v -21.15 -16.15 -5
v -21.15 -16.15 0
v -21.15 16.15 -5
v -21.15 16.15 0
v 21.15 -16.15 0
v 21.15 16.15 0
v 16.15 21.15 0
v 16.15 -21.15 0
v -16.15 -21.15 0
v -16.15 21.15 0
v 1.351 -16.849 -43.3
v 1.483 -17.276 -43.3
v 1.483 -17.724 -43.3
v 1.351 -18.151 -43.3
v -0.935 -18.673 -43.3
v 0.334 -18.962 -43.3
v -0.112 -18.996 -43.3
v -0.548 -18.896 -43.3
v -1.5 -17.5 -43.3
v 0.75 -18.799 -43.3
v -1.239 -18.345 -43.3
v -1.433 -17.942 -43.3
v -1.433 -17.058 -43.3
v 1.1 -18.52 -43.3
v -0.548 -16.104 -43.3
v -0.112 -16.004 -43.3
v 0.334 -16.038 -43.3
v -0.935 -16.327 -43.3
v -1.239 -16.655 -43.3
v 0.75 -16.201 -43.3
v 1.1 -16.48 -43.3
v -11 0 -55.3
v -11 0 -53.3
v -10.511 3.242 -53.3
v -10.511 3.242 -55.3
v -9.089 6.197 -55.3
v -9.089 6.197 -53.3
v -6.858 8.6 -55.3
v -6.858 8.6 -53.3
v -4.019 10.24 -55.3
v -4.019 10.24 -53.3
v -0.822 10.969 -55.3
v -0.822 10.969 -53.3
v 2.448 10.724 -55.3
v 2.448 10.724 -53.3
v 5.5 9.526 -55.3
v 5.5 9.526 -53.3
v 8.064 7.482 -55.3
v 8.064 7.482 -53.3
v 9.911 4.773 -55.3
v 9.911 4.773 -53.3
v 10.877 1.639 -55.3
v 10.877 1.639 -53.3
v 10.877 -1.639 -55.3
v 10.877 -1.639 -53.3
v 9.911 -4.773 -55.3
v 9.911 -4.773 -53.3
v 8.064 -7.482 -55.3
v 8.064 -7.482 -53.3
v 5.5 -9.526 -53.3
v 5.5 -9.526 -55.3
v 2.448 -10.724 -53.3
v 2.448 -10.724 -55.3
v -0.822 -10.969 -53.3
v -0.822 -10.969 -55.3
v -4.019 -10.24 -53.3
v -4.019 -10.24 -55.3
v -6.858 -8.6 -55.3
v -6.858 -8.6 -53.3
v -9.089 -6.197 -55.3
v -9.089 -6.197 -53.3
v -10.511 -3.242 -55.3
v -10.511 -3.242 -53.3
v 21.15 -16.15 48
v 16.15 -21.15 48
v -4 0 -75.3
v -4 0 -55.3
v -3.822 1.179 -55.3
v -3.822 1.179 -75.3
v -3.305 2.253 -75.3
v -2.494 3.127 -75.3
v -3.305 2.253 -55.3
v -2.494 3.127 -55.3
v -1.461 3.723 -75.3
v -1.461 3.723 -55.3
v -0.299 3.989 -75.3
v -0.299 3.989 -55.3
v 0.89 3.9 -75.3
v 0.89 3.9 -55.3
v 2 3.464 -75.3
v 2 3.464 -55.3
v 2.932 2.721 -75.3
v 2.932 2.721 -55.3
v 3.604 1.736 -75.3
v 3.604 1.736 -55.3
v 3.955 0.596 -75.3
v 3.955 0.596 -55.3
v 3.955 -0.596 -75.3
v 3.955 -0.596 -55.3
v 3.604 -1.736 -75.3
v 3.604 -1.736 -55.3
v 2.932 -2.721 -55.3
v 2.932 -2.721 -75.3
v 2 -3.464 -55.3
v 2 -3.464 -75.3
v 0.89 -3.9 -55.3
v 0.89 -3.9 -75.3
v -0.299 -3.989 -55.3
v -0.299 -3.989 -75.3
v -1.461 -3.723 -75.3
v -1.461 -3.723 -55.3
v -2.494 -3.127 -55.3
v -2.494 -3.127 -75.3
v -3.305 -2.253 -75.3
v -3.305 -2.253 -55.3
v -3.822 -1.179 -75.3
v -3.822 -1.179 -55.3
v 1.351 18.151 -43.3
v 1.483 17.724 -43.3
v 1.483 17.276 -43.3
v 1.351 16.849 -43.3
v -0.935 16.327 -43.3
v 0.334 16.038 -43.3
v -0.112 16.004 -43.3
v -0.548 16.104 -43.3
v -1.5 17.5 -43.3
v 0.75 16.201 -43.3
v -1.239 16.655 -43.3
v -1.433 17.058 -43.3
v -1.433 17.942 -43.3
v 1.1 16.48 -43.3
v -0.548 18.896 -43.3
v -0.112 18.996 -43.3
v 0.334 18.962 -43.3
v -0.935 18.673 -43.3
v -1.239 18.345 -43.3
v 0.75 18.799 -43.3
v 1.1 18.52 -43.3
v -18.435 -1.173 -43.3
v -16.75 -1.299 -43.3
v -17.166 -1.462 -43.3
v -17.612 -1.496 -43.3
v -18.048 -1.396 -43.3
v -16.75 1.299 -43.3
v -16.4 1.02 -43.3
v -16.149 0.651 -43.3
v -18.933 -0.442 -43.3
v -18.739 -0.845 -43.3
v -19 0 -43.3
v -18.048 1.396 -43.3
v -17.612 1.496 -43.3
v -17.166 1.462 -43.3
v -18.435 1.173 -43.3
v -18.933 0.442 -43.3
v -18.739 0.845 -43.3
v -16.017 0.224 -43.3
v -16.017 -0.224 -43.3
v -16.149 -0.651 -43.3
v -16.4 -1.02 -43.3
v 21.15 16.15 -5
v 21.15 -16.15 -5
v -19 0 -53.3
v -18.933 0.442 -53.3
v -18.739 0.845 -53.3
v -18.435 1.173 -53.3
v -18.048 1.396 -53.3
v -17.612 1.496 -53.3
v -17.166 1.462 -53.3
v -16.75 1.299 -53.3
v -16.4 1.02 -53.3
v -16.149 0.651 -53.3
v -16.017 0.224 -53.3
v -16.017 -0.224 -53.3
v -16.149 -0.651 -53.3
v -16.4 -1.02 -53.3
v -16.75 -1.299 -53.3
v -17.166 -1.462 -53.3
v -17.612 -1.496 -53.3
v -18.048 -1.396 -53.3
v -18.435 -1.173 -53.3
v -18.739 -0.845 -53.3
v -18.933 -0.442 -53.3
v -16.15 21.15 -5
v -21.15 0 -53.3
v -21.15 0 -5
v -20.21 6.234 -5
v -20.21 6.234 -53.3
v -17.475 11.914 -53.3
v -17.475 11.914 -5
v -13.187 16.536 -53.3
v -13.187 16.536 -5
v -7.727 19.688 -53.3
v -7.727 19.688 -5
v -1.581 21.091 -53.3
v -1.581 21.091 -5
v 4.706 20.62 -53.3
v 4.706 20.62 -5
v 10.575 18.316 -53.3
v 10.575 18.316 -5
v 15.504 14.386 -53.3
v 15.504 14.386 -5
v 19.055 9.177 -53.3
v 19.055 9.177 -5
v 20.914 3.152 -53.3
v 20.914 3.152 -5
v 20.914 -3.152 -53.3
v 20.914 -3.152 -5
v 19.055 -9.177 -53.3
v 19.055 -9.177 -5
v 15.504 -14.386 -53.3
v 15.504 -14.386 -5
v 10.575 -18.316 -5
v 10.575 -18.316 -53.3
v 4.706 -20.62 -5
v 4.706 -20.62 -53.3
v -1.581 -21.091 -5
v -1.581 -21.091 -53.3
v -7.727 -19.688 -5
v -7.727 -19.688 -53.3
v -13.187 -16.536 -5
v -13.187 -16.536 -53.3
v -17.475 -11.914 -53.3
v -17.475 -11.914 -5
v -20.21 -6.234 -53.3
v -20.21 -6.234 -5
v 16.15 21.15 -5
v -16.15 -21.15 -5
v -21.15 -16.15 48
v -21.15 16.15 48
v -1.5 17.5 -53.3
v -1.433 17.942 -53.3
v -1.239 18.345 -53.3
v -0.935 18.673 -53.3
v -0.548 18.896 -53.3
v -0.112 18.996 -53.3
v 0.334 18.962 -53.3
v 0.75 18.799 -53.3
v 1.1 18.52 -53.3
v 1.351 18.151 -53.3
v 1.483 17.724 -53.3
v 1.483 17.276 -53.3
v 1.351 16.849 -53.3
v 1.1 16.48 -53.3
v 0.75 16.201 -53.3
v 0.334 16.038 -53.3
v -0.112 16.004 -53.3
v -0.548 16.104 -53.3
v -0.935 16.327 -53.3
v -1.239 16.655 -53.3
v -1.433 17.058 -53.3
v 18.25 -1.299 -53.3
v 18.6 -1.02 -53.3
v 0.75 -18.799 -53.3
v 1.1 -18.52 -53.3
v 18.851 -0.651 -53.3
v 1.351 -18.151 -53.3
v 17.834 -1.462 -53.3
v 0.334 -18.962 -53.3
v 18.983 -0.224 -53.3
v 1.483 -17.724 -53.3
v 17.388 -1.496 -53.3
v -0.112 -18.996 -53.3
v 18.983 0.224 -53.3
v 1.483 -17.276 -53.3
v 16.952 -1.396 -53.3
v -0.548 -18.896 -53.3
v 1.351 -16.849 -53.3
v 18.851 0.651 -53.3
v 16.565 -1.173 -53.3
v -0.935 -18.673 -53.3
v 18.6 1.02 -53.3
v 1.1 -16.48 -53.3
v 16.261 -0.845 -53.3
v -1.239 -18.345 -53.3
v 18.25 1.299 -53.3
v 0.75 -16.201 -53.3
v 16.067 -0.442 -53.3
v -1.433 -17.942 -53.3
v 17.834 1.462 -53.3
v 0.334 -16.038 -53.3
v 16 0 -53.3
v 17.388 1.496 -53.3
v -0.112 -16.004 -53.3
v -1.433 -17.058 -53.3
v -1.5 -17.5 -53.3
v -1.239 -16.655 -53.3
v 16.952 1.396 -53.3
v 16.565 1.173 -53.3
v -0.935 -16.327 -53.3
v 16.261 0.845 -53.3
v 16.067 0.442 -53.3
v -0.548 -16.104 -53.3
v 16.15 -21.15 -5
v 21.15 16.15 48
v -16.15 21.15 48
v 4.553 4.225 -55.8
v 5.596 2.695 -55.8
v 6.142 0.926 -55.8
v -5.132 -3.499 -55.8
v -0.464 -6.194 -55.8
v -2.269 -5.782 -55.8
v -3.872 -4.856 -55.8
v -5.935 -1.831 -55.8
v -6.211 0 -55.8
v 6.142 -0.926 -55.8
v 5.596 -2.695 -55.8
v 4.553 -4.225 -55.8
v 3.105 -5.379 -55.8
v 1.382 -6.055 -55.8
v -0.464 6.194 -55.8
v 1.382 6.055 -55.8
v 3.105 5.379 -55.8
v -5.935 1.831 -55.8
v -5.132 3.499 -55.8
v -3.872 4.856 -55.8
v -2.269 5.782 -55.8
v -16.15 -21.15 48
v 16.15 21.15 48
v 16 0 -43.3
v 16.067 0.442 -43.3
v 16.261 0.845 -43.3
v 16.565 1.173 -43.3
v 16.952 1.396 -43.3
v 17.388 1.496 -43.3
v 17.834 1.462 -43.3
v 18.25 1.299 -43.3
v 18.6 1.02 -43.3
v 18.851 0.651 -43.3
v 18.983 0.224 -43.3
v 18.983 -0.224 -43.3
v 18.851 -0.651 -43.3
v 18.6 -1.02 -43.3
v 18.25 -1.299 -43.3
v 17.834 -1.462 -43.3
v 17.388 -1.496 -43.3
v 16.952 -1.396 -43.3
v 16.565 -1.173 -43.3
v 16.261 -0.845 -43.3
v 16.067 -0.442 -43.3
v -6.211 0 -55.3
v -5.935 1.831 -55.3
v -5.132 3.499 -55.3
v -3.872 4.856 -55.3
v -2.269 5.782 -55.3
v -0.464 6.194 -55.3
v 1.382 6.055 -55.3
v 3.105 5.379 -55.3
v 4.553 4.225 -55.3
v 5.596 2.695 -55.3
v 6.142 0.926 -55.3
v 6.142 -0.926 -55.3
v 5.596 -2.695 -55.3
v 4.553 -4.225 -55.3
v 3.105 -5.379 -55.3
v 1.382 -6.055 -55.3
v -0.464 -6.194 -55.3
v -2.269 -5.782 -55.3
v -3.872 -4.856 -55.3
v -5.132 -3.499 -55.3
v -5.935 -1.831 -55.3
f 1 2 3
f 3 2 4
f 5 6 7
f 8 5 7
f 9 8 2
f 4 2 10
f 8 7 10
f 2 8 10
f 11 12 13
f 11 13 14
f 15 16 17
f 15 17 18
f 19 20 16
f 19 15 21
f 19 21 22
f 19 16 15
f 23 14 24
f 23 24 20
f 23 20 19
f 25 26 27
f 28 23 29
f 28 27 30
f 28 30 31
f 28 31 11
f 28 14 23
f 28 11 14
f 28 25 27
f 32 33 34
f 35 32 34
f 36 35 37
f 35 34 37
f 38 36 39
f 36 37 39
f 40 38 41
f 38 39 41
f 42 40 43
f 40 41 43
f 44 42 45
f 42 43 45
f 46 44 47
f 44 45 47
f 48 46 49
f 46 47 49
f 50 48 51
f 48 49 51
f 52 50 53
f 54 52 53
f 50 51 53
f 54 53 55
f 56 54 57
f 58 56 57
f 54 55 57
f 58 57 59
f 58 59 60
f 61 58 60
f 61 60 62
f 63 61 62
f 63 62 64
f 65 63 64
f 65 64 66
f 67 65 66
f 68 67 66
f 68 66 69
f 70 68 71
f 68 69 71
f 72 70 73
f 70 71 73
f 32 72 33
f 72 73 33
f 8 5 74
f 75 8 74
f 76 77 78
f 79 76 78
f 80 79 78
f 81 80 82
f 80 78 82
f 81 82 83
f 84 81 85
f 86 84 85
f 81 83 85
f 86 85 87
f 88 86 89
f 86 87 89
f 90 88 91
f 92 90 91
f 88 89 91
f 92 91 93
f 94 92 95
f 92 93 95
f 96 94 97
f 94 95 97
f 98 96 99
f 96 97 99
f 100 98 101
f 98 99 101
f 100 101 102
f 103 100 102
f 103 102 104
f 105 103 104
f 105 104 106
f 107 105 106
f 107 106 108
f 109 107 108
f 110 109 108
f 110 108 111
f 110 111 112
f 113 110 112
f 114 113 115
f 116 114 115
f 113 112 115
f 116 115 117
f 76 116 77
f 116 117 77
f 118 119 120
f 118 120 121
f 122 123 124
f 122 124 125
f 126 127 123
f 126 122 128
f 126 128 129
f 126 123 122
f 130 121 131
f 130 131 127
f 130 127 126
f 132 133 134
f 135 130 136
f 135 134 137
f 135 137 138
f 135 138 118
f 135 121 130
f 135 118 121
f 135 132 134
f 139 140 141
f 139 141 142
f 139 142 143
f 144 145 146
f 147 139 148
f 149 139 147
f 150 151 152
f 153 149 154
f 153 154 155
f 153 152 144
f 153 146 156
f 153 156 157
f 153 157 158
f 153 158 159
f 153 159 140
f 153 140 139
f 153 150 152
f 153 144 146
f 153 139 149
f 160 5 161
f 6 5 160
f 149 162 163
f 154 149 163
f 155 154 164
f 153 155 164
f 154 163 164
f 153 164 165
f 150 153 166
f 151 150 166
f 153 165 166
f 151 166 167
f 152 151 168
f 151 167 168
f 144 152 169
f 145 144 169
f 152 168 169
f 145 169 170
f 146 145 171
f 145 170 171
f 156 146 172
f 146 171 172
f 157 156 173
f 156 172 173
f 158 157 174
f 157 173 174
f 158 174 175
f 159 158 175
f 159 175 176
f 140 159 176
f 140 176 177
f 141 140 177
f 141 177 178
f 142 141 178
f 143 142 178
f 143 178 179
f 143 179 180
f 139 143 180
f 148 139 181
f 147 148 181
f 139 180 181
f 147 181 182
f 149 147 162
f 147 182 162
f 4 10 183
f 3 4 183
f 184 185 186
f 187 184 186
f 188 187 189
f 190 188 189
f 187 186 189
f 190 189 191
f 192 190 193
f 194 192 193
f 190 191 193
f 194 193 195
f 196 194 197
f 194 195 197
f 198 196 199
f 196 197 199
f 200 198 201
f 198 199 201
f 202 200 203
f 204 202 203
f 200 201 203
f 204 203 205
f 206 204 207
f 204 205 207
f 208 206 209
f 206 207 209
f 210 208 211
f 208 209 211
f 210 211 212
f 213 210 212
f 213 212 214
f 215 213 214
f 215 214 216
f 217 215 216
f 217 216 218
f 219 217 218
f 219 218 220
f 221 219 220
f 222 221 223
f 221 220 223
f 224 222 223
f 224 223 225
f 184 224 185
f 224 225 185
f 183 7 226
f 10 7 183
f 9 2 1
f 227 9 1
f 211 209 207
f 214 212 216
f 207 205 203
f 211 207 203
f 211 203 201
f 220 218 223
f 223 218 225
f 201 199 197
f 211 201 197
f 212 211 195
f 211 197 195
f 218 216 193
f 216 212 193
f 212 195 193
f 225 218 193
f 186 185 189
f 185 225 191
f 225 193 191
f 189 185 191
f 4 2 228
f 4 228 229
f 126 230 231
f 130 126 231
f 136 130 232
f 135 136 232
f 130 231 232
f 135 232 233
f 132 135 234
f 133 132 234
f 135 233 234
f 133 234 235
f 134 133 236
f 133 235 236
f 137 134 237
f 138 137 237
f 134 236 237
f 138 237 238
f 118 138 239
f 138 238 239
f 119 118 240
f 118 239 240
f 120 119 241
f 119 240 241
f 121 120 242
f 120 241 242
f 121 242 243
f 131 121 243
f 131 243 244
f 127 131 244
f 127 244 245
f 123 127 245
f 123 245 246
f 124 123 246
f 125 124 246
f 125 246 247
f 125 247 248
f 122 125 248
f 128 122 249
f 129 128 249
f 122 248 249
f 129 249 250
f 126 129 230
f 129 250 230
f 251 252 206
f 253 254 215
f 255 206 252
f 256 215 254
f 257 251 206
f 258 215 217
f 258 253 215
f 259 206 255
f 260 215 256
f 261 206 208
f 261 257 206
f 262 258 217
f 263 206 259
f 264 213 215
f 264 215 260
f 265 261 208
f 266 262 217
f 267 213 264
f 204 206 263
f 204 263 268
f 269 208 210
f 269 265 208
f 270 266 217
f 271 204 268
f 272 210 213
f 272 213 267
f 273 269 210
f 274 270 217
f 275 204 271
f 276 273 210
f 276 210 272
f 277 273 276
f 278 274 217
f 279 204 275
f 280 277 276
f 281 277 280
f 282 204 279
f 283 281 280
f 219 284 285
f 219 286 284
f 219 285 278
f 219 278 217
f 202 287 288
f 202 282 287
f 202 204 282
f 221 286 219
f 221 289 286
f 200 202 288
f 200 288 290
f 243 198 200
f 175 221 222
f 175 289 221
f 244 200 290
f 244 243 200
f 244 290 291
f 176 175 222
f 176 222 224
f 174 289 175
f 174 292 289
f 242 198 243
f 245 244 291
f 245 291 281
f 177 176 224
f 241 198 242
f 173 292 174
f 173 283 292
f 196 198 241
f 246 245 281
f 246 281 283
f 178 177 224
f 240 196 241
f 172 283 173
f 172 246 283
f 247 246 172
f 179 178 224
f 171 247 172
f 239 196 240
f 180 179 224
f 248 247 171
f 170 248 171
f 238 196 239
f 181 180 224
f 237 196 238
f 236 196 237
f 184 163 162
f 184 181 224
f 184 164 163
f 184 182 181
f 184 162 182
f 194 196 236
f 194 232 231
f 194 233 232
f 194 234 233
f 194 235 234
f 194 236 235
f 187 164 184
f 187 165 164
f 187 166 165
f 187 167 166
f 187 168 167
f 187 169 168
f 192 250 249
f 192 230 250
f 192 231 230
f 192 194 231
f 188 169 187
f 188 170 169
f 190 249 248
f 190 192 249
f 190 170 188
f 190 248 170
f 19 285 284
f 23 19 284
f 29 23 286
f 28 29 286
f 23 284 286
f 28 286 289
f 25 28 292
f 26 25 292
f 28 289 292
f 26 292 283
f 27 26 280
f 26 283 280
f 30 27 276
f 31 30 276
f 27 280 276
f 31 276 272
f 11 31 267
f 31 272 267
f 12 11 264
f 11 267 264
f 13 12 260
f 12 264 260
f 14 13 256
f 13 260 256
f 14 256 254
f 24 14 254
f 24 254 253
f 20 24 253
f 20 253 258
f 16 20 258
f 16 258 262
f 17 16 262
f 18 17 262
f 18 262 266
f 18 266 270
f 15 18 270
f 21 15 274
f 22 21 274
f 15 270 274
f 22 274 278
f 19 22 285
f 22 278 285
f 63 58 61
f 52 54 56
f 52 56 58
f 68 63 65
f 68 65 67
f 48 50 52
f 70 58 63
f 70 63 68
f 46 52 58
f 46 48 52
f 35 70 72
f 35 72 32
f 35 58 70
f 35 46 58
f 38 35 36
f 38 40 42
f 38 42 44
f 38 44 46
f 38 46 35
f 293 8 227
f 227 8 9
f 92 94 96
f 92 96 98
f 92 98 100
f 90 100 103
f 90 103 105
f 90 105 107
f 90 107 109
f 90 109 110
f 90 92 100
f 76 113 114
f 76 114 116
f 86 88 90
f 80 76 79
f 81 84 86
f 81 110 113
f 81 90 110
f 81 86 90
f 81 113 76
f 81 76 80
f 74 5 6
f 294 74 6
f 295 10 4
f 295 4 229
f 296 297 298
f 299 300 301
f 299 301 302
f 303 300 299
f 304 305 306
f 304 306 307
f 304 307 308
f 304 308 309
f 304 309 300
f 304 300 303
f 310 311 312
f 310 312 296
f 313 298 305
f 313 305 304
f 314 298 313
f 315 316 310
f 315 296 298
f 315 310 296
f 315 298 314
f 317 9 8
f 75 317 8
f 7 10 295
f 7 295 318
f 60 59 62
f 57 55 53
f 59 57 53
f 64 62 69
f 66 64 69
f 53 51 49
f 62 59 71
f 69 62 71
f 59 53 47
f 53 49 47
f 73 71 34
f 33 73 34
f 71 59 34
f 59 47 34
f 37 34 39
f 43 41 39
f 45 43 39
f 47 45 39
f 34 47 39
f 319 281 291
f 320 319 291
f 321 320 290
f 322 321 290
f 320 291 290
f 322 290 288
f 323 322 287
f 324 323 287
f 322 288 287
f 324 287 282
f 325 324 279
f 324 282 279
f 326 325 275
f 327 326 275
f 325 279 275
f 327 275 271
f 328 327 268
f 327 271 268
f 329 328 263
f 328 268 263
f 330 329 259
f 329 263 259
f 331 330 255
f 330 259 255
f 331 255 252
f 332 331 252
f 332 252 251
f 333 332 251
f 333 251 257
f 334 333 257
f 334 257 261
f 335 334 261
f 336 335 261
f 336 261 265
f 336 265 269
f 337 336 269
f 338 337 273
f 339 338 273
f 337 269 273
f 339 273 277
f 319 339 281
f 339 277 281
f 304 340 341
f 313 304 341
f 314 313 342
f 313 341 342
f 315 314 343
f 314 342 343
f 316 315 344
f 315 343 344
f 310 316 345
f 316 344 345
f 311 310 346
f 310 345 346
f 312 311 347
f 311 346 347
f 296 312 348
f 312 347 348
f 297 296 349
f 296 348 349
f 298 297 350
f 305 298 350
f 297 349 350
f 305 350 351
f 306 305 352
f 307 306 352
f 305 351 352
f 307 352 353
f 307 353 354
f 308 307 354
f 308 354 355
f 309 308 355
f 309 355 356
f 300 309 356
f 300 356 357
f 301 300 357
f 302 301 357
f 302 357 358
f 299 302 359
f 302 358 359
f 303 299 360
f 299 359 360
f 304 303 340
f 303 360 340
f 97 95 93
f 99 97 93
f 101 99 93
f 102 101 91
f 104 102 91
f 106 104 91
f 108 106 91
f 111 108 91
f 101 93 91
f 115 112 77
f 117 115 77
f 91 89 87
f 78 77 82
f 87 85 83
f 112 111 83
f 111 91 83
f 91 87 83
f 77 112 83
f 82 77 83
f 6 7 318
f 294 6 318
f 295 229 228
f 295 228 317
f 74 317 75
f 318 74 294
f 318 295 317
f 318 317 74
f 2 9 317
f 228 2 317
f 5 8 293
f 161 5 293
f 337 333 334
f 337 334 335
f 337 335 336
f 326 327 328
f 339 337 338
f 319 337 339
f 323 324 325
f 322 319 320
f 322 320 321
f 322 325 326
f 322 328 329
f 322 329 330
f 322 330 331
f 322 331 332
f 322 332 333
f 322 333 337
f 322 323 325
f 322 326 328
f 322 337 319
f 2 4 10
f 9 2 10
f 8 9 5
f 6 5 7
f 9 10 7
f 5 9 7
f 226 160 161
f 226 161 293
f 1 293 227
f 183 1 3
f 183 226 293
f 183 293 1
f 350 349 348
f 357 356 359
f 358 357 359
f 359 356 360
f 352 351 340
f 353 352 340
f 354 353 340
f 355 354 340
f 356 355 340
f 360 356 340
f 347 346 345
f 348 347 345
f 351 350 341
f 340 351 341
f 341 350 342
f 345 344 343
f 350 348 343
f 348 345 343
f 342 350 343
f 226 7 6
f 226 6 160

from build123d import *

# Parameters (mm, degrees)
SKETCH1_W           = 42.3
SKETCH1_H           = 42.3
BOSS_EXTRUDE1_DEPTH = 48
CHAMFER1_SIZE       = 5
SKETCH2_W           = 42.3
SKETCH2_H           = 42.3
BOSS_EXTRUDE2_DEPTH = 5
CHAMFER2_SIZE       = 5
SKETCH3_R           = 21.15
BOSS_EXTRUDE3_DEPTH = 48.3
SKETCH4_R           = 11
BOSS_EXTRUDE4_DEPTH = 2
SKETCH5_R           = 4
BOSS_EXTRUDE5_DEPTH = 20
SKETCH6_R           = 6.210975092
BOSS_EXTRUDE6_DEPTH = 0.5
SKETCH7_R           = 1.5
CUT_EXTRUDE2_DEPTH  = 10


with BuildPart() as part:
    # Sketch1 → Boss-Extrude1 (new body)
    with BuildSketch(Plane.XY):
        Rectangle(SKETCH1_W, SKETCH1_H)
    extrude(amount=BOSS_EXTRUDE1_DEPTH)

    # Chamfer1
    chamfer1_edges = [part.edges().sort_by_distance(p)[0] for p in [
        (21.15, -21.15, 24),
        (-21.15, -21.15, 24),
        (-21.15, 21.15, 24),
        (21.15, 21.15, 24),
    ]]
    chamfer(chamfer1_edges, length=CHAMFER1_SIZE)


with BuildPart() as body_2:
    # Sketch2 → Boss-Extrude2 (new body)
    with BuildSketch(Plane(origin=(0, 0, 0), x_dir=(-1, 0, 0), z_dir=(0, 0, -1))):
        Rectangle(SKETCH2_W, SKETCH2_H)
    extrude(amount=BOSS_EXTRUDE2_DEPTH)

    # Chamfer2
    chamfer2_edges = [body_2.edges().sort_by_distance(p)[0] for p in [
        (-21.15, -21.15, -2.5),
        (21.15, -21.15, -2.5),
        (21.15, 21.15, -2.5),
        (-21.15, 21.15, -2.5),
    ]]
    chamfer(chamfer2_edges, length=CHAMFER2_SIZE)


with BuildPart() as body_3:
    # Sketch3 → Boss-Extrude3 (new body)
    with BuildSketch(Plane(origin=(0, 0, -5), x_dir=(-1, 0, 0), z_dir=(0, 0, -1))):
        Circle(SKETCH3_R)
    extrude(amount=BOSS_EXTRUDE3_DEPTH)

    # Sketch7 → Cut-Extrude2 (cut)
    with BuildSketch(Plane(origin=(0, 0, -53.3), x_dir=(-1, 0, 0), z_dir=(0, 0, -1))):
        with Locations((-17.5, 0)):
            Circle(SKETCH7_R)
        with Locations((0, 17.5)):
            Circle(SKETCH7_R)
        with Locations((17.5, 0)):
            Circle(SKETCH7_R)
        with Locations((0, -17.5)):
            Circle(SKETCH7_R)
    extrude(amount=-CUT_EXTRUDE2_DEPTH, mode=Mode.SUBTRACT)


with BuildPart() as body_4:
    # Sketch4 → Boss-Extrude4 (new body)
    with BuildSketch(Plane(origin=(0, 0, -53.3), x_dir=(-1, 0, 0), z_dir=(0, 0, -1))):
        Circle(SKETCH4_R)
    extrude(amount=BOSS_EXTRUDE4_DEPTH)


with BuildPart() as body_5:
    # Sketch5 → Boss-Extrude5 (new body)
    with BuildSketch(Plane(origin=(0, 0, -55.3), x_dir=(-1, 0, 0), z_dir=(0, 0, -1))):
        Circle(SKETCH5_R)
    extrude(amount=BOSS_EXTRUDE5_DEPTH)


with BuildPart() as body_6:
    # Sketch6 → Boss-Extrude6 (new body)
    with BuildSketch(Plane(origin=(0, 0, -55.3), x_dir=(-1, 0, 0), z_dir=(0, 0, -1))):
        Circle(SKETCH6_R)
    extrude(amount=BOSS_EXTRUDE6_DEPTH)


solid = Compound([part.part, body_2.part, body_3.part, body_4.part, body_5.part, body_6.part])
